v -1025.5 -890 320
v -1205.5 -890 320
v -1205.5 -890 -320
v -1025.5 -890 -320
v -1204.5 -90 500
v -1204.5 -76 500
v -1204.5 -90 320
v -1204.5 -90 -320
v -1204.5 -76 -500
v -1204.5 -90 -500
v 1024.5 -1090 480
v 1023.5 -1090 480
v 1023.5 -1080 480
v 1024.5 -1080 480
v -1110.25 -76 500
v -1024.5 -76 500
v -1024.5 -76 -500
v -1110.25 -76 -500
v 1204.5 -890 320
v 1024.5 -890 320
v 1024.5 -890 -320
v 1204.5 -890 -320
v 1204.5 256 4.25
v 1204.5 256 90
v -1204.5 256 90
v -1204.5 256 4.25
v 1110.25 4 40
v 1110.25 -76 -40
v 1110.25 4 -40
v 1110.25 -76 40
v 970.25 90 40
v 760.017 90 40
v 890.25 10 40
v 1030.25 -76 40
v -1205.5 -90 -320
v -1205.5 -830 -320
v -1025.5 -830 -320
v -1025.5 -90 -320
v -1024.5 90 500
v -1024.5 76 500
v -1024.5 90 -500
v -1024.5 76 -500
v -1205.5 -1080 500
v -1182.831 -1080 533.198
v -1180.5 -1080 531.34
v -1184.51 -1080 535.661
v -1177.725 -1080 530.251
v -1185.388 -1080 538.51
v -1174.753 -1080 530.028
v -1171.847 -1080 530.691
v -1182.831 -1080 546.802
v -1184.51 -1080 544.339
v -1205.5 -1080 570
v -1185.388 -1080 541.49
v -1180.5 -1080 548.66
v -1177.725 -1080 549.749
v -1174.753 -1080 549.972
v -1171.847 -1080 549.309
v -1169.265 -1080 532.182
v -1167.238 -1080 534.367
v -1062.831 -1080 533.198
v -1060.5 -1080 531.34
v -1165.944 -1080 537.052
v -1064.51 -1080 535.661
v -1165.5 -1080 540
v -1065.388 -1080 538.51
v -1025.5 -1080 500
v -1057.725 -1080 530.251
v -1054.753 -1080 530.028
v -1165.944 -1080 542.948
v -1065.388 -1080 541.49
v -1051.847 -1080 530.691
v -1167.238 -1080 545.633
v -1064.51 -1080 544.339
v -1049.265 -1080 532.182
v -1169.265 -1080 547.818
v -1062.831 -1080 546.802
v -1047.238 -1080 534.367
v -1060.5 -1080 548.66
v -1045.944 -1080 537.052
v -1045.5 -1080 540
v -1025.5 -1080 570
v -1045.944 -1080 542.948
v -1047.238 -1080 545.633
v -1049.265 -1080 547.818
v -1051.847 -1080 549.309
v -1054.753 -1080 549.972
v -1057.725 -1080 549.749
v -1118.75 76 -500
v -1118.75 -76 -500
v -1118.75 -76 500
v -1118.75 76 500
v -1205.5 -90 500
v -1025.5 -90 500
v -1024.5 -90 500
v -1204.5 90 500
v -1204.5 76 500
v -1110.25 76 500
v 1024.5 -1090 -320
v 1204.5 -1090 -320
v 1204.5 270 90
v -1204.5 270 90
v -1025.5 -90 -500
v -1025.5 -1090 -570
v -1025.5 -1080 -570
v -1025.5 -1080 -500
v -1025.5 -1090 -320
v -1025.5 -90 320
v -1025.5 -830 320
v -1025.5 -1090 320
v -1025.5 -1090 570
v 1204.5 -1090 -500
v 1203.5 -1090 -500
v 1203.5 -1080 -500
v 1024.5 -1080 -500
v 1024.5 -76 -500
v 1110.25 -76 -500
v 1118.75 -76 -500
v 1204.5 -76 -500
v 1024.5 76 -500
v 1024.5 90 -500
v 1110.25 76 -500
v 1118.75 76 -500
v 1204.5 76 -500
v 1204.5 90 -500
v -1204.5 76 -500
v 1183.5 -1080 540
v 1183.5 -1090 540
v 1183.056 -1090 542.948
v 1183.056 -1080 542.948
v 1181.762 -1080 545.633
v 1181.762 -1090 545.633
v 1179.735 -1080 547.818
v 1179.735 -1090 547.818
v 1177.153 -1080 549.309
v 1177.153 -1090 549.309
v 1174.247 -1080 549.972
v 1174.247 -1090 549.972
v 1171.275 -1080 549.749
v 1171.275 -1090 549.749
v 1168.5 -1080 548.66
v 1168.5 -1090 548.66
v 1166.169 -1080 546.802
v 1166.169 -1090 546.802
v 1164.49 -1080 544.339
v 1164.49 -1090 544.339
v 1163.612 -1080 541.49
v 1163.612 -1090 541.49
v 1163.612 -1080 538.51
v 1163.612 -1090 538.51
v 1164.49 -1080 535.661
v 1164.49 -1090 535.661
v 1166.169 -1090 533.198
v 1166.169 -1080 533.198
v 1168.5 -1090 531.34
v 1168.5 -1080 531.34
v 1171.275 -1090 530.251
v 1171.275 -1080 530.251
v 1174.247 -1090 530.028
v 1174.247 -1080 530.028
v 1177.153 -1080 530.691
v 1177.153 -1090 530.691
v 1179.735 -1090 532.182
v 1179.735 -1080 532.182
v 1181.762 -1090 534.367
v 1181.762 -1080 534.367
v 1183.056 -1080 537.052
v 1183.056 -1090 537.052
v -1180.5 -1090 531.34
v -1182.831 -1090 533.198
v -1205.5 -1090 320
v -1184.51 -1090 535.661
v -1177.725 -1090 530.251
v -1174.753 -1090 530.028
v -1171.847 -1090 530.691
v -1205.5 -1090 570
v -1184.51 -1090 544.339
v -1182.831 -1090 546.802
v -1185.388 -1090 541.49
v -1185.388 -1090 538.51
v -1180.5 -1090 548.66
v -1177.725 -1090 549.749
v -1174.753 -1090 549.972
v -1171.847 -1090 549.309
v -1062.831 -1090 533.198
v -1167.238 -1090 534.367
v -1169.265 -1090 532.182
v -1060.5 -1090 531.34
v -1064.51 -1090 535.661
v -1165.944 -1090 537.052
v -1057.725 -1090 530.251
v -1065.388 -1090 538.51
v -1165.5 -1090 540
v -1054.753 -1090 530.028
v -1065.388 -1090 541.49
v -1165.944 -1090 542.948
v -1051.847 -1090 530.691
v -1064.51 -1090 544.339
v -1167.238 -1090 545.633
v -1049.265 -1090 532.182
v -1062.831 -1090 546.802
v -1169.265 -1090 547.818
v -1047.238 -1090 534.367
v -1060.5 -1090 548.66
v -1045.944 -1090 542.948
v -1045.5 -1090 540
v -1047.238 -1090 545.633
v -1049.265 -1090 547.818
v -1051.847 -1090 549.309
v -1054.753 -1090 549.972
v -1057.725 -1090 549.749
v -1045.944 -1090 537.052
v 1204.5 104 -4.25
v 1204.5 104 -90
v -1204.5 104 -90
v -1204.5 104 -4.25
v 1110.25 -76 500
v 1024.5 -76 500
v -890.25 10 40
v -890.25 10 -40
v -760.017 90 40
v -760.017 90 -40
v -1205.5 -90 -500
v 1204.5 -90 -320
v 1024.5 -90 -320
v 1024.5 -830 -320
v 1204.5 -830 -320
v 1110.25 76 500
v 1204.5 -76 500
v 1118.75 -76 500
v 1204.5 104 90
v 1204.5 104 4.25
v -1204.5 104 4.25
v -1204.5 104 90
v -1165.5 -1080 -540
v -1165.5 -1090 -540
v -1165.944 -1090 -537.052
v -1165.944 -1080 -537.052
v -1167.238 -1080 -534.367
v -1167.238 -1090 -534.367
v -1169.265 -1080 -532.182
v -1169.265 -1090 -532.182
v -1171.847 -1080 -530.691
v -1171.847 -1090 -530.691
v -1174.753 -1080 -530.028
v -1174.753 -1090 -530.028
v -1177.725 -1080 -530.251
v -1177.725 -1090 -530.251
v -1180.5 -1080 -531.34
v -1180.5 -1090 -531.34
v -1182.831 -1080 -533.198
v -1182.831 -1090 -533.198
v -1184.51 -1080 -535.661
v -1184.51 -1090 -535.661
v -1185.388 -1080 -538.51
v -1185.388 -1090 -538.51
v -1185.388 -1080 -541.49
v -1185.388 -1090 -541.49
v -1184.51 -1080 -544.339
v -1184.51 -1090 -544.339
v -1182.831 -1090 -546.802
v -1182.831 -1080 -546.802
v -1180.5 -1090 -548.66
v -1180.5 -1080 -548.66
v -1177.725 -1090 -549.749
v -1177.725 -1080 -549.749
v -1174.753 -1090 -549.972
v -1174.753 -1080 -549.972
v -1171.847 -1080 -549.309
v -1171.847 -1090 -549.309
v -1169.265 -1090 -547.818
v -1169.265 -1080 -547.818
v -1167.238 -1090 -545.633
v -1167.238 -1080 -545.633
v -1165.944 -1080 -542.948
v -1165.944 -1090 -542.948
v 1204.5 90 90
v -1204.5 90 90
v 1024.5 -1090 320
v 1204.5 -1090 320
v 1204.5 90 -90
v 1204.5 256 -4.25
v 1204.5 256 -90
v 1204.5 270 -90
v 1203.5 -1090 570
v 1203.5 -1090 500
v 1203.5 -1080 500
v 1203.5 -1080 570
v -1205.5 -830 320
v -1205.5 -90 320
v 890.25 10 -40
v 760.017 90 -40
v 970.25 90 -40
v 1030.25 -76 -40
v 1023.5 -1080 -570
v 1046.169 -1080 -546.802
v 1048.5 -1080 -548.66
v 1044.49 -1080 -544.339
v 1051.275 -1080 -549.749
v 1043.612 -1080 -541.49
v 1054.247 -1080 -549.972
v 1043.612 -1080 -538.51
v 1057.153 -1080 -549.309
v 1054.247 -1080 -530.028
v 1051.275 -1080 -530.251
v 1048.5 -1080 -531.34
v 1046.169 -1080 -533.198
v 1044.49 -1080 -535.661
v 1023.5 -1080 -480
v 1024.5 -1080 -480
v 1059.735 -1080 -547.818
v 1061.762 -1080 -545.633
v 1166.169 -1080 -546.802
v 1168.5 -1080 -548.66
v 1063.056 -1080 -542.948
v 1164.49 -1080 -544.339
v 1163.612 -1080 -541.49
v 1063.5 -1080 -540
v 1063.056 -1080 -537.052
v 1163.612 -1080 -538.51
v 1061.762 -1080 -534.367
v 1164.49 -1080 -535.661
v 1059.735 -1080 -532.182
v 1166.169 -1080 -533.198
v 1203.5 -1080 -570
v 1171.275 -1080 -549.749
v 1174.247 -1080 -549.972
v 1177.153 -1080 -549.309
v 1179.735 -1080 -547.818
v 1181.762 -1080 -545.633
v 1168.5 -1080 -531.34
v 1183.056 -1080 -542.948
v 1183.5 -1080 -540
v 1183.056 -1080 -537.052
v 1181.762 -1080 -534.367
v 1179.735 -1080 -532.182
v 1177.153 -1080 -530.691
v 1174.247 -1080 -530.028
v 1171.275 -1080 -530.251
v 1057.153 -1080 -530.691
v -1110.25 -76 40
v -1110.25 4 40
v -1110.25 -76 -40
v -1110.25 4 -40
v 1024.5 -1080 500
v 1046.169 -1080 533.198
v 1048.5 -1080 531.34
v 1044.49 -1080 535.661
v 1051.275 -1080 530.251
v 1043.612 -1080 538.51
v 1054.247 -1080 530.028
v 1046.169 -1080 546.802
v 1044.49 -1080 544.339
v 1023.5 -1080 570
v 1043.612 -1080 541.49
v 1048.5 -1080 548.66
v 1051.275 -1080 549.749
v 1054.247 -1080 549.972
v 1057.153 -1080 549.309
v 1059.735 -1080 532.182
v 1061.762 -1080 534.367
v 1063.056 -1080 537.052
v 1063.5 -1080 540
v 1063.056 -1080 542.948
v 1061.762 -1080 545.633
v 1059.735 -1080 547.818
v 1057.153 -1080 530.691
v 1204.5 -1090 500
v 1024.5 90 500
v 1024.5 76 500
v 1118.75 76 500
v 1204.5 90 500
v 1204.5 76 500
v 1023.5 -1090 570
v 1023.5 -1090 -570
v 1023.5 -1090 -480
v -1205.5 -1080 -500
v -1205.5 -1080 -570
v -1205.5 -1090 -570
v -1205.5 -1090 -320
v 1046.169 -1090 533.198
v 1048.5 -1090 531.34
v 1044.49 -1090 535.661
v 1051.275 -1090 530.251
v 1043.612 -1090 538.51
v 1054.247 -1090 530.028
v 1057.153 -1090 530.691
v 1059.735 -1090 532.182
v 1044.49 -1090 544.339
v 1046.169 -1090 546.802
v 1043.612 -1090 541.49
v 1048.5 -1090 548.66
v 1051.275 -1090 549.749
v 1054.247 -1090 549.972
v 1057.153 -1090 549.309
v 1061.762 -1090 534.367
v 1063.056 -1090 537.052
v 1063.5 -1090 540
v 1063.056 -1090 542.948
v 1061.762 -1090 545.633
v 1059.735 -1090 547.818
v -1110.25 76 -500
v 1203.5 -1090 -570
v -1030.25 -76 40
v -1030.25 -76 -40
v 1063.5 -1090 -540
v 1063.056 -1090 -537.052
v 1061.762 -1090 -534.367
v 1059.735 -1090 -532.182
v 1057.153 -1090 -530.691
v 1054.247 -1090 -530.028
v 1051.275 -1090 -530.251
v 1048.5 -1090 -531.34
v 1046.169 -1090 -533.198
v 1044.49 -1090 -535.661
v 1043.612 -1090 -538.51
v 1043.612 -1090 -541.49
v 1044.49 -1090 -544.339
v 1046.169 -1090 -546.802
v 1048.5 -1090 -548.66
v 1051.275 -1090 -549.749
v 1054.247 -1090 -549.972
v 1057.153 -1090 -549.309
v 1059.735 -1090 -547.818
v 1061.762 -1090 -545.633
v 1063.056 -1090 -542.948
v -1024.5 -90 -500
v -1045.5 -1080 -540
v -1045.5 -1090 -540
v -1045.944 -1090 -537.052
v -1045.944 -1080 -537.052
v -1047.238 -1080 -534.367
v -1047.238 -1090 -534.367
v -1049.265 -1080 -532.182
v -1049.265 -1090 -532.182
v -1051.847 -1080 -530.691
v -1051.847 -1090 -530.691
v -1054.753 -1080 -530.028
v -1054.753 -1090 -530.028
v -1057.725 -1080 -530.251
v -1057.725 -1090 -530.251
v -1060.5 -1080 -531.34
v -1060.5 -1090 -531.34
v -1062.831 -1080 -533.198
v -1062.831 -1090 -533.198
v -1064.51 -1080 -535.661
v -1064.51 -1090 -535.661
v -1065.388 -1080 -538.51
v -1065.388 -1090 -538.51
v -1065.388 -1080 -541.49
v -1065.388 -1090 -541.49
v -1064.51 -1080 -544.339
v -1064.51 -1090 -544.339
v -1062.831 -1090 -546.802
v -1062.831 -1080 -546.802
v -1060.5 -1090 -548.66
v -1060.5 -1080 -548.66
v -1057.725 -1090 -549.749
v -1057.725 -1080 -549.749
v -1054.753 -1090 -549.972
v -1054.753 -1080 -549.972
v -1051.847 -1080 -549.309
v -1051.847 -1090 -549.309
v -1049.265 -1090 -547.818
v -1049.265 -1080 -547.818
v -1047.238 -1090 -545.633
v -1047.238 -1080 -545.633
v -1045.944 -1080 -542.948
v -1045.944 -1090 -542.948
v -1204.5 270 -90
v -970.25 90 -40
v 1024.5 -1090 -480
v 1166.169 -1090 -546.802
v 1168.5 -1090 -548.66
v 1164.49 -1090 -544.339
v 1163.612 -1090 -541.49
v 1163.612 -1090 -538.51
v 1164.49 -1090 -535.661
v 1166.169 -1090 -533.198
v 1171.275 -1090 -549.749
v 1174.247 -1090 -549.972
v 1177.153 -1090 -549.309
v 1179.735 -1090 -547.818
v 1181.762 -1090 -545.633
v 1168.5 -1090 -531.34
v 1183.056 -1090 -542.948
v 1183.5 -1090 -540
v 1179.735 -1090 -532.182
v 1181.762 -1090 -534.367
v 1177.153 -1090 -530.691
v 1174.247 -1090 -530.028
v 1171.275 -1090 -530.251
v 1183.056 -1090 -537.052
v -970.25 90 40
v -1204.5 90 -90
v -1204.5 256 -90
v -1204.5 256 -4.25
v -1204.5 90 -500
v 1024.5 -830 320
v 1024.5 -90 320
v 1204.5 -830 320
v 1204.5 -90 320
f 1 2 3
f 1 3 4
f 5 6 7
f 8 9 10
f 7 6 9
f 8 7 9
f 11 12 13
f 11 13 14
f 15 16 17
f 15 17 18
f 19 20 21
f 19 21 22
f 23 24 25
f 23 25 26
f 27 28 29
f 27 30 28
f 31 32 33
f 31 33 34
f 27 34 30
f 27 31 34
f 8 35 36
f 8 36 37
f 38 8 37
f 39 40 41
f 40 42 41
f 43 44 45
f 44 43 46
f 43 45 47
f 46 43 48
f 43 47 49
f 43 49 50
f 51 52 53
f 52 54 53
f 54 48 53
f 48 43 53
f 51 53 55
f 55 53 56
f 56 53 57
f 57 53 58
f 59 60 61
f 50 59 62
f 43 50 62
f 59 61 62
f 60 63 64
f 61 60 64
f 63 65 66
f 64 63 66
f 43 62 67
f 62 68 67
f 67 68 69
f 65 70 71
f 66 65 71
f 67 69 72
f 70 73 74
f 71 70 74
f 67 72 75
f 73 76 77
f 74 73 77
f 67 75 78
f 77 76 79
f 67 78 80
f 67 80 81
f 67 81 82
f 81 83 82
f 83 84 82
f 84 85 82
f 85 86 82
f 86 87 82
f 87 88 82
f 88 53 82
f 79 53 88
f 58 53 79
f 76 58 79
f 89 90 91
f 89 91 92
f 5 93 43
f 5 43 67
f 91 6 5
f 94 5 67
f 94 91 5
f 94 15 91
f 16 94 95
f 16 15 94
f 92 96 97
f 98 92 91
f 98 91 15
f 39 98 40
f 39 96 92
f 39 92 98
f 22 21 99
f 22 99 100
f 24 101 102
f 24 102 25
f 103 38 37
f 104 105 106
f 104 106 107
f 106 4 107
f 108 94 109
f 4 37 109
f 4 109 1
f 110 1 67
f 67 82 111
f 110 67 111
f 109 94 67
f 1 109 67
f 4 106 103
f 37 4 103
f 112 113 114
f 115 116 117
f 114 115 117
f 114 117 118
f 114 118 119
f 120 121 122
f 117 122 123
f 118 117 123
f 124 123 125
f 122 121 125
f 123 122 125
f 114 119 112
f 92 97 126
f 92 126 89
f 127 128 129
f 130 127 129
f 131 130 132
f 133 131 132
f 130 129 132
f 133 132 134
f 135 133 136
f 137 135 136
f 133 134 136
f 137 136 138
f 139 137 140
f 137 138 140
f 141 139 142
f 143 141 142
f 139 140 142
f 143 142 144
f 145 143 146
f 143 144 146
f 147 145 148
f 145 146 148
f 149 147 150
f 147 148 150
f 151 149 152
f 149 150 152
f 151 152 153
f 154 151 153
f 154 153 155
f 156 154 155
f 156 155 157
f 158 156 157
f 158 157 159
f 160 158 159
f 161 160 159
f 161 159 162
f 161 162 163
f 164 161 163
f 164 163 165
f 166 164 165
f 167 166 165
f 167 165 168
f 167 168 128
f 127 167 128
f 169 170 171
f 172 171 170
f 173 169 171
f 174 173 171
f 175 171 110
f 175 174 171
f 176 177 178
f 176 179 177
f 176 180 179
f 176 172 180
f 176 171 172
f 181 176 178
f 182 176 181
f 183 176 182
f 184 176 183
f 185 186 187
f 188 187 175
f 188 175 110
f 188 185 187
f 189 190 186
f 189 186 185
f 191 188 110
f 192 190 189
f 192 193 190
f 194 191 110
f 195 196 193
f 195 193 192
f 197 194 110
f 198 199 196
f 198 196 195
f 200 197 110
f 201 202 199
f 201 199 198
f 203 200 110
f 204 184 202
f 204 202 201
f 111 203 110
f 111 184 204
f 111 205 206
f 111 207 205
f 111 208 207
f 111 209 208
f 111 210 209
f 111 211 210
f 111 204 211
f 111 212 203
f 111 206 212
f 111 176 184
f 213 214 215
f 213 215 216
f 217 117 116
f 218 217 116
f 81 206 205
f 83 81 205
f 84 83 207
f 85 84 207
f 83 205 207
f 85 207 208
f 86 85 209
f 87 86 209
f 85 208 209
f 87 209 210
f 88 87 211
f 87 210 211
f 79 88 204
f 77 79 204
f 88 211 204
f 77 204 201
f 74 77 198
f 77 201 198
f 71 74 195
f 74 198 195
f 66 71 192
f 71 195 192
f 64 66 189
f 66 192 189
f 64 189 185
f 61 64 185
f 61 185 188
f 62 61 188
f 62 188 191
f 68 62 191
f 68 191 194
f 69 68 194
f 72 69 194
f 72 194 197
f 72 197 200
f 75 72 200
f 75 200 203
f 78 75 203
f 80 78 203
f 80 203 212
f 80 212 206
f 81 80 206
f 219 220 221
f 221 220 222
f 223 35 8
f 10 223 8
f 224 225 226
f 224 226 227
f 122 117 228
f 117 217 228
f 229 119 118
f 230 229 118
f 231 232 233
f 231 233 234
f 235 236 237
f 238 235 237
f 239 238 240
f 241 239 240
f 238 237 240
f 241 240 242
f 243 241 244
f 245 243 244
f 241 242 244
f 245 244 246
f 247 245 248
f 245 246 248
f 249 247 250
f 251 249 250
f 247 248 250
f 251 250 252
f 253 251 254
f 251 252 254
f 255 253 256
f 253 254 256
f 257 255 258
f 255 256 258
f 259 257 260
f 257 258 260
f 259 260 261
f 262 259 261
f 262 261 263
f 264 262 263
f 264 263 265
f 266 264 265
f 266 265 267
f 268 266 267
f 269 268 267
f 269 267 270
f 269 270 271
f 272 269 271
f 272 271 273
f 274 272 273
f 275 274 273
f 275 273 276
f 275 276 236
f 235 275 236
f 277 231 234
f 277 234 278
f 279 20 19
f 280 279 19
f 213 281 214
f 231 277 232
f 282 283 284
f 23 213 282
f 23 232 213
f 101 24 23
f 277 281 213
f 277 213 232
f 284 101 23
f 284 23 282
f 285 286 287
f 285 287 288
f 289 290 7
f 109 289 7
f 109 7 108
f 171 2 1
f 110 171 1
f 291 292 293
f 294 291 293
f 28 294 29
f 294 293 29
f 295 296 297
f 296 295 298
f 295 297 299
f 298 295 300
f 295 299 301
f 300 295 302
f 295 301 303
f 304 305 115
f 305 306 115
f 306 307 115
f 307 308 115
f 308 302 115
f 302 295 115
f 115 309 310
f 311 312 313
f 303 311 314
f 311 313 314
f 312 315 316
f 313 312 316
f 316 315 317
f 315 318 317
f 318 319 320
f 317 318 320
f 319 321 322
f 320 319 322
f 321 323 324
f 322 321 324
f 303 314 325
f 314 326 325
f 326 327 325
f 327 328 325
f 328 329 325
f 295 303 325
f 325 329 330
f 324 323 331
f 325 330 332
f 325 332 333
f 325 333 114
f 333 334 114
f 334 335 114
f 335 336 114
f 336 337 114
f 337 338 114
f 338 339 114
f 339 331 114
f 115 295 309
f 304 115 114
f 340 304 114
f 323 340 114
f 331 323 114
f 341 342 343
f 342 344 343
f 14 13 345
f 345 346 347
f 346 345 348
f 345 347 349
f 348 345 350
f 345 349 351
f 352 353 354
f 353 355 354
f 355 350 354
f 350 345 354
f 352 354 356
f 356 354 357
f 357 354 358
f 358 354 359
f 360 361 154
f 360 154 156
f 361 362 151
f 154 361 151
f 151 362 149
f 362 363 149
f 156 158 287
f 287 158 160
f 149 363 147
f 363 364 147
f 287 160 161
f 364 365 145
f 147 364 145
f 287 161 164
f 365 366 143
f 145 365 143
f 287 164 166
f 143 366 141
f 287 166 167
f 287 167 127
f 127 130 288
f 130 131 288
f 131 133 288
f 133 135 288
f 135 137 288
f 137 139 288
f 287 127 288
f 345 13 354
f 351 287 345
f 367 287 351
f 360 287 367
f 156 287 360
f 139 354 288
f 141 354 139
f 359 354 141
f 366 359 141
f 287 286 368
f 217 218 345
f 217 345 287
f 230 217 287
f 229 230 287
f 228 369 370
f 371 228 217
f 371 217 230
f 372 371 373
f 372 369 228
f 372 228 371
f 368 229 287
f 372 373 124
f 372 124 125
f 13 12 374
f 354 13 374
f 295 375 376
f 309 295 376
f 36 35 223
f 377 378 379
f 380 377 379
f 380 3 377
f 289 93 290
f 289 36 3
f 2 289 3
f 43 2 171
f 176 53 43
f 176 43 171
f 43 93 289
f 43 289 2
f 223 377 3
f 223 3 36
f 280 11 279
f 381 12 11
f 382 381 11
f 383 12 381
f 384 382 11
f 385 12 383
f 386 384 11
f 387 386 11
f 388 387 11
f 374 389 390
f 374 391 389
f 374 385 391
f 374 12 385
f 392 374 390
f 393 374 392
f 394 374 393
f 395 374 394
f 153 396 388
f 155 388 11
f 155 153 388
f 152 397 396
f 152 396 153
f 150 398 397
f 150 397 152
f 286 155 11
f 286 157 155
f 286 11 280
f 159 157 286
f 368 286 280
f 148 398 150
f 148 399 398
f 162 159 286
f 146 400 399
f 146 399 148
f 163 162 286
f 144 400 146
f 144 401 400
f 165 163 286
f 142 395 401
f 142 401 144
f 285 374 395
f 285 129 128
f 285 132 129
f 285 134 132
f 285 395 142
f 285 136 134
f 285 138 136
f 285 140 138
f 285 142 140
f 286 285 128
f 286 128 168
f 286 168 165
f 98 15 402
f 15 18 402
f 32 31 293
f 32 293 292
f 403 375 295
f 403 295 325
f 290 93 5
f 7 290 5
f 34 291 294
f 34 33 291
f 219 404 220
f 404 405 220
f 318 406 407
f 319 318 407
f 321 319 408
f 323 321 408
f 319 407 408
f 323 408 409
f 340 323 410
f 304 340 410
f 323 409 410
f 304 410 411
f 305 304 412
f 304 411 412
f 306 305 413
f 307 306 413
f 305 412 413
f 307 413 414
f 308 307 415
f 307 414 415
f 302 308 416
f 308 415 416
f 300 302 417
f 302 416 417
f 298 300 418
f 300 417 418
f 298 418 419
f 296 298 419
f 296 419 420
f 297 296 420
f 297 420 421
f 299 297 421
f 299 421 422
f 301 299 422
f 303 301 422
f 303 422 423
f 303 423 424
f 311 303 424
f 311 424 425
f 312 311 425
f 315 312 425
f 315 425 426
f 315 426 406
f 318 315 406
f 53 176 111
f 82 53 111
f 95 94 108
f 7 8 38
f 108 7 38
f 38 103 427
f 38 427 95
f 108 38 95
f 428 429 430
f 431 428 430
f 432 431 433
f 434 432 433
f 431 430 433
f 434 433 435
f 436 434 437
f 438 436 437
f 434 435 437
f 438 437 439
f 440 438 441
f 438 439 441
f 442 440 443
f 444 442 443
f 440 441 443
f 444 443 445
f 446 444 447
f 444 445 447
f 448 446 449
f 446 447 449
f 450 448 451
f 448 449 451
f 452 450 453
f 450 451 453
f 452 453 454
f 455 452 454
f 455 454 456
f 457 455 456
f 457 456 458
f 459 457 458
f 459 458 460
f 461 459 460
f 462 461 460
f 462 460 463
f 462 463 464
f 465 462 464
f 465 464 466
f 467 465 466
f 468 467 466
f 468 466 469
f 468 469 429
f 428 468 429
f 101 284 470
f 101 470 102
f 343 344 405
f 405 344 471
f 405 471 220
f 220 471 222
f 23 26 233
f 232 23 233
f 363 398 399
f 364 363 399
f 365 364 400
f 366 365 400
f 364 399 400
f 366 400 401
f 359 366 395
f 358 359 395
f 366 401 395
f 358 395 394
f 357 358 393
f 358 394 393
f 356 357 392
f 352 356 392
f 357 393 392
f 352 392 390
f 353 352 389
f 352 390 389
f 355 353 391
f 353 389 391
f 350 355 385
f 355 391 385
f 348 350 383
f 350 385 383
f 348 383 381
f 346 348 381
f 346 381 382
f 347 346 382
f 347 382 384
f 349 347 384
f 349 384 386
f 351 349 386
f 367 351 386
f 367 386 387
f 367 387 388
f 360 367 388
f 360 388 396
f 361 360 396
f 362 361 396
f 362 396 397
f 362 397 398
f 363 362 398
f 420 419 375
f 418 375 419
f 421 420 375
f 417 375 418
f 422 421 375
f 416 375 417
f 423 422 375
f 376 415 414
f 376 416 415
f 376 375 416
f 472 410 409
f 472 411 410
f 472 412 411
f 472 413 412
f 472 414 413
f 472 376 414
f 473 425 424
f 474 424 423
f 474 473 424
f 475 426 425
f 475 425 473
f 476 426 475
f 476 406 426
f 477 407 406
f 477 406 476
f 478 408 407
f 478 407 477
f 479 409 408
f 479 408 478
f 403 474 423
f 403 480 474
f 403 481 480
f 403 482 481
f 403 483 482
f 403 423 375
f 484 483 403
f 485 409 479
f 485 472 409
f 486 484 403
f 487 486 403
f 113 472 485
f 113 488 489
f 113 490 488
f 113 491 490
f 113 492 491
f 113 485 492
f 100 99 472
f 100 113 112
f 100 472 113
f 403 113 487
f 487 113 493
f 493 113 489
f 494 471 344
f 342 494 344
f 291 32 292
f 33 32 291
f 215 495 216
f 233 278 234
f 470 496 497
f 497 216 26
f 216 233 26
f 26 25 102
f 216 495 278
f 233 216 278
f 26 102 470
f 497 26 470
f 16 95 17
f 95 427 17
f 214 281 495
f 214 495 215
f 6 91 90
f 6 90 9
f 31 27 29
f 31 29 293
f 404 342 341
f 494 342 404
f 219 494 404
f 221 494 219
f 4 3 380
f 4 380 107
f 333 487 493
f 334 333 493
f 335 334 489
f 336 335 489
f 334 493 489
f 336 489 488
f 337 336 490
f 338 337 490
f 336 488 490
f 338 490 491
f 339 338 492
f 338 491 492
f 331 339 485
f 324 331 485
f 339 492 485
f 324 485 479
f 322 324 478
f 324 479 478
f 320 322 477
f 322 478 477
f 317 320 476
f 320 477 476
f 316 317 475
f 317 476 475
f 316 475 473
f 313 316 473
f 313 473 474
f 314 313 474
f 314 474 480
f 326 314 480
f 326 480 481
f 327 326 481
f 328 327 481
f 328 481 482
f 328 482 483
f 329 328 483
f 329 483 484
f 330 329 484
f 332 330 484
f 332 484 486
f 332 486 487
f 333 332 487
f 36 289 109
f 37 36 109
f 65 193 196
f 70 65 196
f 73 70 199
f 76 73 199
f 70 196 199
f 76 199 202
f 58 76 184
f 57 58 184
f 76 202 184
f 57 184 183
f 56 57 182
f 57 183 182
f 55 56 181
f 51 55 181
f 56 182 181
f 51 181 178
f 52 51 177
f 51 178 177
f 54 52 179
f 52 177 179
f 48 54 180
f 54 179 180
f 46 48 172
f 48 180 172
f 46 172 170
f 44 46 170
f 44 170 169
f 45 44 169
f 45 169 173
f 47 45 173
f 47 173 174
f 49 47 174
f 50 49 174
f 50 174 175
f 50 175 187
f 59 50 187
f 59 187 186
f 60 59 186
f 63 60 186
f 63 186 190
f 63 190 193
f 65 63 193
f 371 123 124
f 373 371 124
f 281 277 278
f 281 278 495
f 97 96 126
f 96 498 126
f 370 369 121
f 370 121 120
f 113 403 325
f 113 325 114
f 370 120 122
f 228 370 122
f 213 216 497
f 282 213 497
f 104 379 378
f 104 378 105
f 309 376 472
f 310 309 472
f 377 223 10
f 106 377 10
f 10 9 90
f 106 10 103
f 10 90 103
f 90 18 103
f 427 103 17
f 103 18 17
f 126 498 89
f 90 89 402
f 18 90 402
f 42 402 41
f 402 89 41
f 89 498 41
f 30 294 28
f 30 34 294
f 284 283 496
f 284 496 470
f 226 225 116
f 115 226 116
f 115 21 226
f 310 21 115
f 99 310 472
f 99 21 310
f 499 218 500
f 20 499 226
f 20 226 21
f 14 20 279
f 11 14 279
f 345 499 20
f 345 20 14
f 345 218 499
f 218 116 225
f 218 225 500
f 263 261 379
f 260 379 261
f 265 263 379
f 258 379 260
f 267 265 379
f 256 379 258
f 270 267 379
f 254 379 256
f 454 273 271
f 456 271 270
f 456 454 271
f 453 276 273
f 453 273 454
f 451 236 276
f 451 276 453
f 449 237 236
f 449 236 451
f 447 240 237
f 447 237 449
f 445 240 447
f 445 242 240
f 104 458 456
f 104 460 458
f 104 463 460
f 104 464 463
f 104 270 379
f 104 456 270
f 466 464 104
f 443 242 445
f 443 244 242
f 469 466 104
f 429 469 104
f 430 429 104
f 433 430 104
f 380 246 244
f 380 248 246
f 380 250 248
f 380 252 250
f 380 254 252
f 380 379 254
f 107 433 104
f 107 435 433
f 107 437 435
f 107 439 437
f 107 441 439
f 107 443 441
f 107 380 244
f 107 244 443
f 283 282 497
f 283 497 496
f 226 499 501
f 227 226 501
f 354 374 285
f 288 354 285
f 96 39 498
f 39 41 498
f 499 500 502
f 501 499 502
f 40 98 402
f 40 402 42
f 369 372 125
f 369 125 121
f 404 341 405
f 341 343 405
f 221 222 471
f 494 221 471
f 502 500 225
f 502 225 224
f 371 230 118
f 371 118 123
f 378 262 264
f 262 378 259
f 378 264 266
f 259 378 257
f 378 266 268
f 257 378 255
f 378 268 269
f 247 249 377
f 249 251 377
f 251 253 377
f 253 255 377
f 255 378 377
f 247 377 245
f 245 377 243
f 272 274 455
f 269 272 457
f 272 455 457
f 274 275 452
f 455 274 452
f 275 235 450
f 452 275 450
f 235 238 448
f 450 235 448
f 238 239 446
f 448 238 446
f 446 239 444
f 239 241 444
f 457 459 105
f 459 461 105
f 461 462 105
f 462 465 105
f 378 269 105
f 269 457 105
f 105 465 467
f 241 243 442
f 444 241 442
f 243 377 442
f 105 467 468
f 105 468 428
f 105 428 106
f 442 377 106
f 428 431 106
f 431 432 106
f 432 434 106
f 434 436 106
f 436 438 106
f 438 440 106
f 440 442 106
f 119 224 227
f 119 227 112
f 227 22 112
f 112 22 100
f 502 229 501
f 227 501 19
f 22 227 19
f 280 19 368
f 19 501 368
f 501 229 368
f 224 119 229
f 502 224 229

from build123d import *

# Parameters (mm, degrees)
F0_W      = 8.5
F0_H      = 152
F1_DEPTH  = 500
F3_DEPTH  = 2409
F4_W      = 180
F4_H      = 180
F5_DEPTH  = 1000
F6_W      = 180
F6_H      = 60
F7_DEPTH  = 700
F8_W      = 180
F8_H      = 60
F9_DEPTH  = 700
F11_DEPTH = 40
F12_W     = 180
F12_H     = 90
F13_DEPTH = 10
F14_R     = 10
F15_DEPTH = 25


with BuildPart() as f1:
    # F0 (on Top) → F1 (new body, symmetric)
    with BuildSketch(Plane.XY):
        Polygon((-1204.5, -90), (-1024.5, -90), (-1024.5, -76), (-1110.25, -76), (-1118.75, -76), (-1204.5, -76), align=None)
        with Locations((-1114.5, 0)):
            Rectangle(F0_W, F0_H)
        Polygon((-1118.75, 76), (-1110.25, 76), (-1024.5, 76), (-1024.5, 90), (-1204.5, 90), (-1204.5, 76), align=None)
        Polygon((1024.5, -90), (1204.5, -90), (1204.5, -76), (1118.75, -76), (1110.25, -76), (1024.5, -76), align=None)
        with Locations((1114.5, 0)):
            Rectangle(F0_W, F0_H)
        Polygon((1110.25, 76), (1118.75, 76), (1204.5, 76), (1204.5, 90), (1024.5, 90), (1024.5, 76), align=None)
    extrude(amount=F1_DEPTH, both=True)

    # F4 (on face) → F5 (join)
    with BuildSketch(Plane.XZ.offset(90)):
        with Locations((1114.5, -410)):
            Rectangle(F4_W, F4_H)
        with Locations((-1115.5, -410)):
            Rectangle(F4_W, F4_H)
        with Locations((-1115.5, 410)):
            Rectangle(F4_W, F4_H)
        with Locations((1114.5, 410)):
            Rectangle(F4_W, F4_H)
    extrude(amount=F5_DEPTH)

    # F6 (on face) → F7 (join)
    with BuildSketch(Plane(origin=(0, 0, 320), x_dir=(1, 0, 0), z_dir=(0, 0, -1))):
        with Locations((1114.5, 860)):
            Rectangle(F6_W, F6_H)
    extrude(amount=F7_DEPTH)

    # F8 (on face) → F9 (join)
    with BuildSketch(Plane(origin=(0, 0, 320), x_dir=(1, 0, 0), z_dir=(0, 0, -1))):
        with Locations((-1115.5, 860)):
            Rectangle(F8_W, F8_H)
    extrude(amount=F9_DEPTH)

    # F12 (on face) → F13 (join)
    with BuildSketch(Plane.XZ.offset(1090)):
        with Locations((-1115.5, 525)):
            Rectangle(F12_W, F12_H)
        with Locations((-1115.5, -525)):
            Rectangle(F12_W, F12_H)
        with Locations((1113.5, 525)):
            Rectangle(F12_W, F12_H)
        with Locations((1113.5, -525)):
            Rectangle(F12_W, F12_H)
    extrude(amount=-F13_DEPTH)

    # F14 (on face) → F15 (cut)
    with BuildSketch(Plane.XZ.offset(1090)):
        with Locations((-1175.5, 540)):
            Circle(F14_R)
        with Locations((-1055.5, 540)):
            Circle(F14_R)
        with Locations((-1055.5, -540)):
            Circle(F14_R)
        with Locations((-1175.5, -540)):
            Circle(F14_R)
        with Locations((1173.5, 540)):
            Circle(F14_R)
        with Locations((1053.5, 540)):
            Circle(F14_R)
        with Locations((1173.5, -540)):
            Circle(F14_R)
        with Locations((1053.5, -540)):
            Circle(F14_R)
    extrude(amount=-F15_DEPTH, mode=Mode.SUBTRACT)


with BuildPart() as f3:
    # F2 (on face) → F3 (new body)
    with BuildSketch(Plane.YZ.offset(1204.5)):
        Polygon((90, 90), (90, -90), (104, -90), (104, -4.25), (256, -4.25), (256, -90), (270, -90), (270, 90), (256, 90), (256, 4.25), (104, 4.25), (104, 90), align=None)
    extrude(amount=-F3_DEPTH)


with BuildPart() as f11:
    # F10 (on Top) → F11 (new body, symmetric)
    with BuildSketch(Plane.XY):
        Polygon((-890.25, 90), (-970.25, 90), (-1110.25, 4), (-1110.25, -76), (-1030.25, -76), (-890.25, 10), (-760.017442, 90), align=None)
        Polygon((1110.25, -76), (1110.25, 4), (970.25, 90), (890.25, 90), (760.017442, 90), (890.25, 10), (1030.25, -76), align=None)
    extrude(amount=F11_DEPTH, both=True)


solid = Compound([f1.part, f3.part, f11.part])
